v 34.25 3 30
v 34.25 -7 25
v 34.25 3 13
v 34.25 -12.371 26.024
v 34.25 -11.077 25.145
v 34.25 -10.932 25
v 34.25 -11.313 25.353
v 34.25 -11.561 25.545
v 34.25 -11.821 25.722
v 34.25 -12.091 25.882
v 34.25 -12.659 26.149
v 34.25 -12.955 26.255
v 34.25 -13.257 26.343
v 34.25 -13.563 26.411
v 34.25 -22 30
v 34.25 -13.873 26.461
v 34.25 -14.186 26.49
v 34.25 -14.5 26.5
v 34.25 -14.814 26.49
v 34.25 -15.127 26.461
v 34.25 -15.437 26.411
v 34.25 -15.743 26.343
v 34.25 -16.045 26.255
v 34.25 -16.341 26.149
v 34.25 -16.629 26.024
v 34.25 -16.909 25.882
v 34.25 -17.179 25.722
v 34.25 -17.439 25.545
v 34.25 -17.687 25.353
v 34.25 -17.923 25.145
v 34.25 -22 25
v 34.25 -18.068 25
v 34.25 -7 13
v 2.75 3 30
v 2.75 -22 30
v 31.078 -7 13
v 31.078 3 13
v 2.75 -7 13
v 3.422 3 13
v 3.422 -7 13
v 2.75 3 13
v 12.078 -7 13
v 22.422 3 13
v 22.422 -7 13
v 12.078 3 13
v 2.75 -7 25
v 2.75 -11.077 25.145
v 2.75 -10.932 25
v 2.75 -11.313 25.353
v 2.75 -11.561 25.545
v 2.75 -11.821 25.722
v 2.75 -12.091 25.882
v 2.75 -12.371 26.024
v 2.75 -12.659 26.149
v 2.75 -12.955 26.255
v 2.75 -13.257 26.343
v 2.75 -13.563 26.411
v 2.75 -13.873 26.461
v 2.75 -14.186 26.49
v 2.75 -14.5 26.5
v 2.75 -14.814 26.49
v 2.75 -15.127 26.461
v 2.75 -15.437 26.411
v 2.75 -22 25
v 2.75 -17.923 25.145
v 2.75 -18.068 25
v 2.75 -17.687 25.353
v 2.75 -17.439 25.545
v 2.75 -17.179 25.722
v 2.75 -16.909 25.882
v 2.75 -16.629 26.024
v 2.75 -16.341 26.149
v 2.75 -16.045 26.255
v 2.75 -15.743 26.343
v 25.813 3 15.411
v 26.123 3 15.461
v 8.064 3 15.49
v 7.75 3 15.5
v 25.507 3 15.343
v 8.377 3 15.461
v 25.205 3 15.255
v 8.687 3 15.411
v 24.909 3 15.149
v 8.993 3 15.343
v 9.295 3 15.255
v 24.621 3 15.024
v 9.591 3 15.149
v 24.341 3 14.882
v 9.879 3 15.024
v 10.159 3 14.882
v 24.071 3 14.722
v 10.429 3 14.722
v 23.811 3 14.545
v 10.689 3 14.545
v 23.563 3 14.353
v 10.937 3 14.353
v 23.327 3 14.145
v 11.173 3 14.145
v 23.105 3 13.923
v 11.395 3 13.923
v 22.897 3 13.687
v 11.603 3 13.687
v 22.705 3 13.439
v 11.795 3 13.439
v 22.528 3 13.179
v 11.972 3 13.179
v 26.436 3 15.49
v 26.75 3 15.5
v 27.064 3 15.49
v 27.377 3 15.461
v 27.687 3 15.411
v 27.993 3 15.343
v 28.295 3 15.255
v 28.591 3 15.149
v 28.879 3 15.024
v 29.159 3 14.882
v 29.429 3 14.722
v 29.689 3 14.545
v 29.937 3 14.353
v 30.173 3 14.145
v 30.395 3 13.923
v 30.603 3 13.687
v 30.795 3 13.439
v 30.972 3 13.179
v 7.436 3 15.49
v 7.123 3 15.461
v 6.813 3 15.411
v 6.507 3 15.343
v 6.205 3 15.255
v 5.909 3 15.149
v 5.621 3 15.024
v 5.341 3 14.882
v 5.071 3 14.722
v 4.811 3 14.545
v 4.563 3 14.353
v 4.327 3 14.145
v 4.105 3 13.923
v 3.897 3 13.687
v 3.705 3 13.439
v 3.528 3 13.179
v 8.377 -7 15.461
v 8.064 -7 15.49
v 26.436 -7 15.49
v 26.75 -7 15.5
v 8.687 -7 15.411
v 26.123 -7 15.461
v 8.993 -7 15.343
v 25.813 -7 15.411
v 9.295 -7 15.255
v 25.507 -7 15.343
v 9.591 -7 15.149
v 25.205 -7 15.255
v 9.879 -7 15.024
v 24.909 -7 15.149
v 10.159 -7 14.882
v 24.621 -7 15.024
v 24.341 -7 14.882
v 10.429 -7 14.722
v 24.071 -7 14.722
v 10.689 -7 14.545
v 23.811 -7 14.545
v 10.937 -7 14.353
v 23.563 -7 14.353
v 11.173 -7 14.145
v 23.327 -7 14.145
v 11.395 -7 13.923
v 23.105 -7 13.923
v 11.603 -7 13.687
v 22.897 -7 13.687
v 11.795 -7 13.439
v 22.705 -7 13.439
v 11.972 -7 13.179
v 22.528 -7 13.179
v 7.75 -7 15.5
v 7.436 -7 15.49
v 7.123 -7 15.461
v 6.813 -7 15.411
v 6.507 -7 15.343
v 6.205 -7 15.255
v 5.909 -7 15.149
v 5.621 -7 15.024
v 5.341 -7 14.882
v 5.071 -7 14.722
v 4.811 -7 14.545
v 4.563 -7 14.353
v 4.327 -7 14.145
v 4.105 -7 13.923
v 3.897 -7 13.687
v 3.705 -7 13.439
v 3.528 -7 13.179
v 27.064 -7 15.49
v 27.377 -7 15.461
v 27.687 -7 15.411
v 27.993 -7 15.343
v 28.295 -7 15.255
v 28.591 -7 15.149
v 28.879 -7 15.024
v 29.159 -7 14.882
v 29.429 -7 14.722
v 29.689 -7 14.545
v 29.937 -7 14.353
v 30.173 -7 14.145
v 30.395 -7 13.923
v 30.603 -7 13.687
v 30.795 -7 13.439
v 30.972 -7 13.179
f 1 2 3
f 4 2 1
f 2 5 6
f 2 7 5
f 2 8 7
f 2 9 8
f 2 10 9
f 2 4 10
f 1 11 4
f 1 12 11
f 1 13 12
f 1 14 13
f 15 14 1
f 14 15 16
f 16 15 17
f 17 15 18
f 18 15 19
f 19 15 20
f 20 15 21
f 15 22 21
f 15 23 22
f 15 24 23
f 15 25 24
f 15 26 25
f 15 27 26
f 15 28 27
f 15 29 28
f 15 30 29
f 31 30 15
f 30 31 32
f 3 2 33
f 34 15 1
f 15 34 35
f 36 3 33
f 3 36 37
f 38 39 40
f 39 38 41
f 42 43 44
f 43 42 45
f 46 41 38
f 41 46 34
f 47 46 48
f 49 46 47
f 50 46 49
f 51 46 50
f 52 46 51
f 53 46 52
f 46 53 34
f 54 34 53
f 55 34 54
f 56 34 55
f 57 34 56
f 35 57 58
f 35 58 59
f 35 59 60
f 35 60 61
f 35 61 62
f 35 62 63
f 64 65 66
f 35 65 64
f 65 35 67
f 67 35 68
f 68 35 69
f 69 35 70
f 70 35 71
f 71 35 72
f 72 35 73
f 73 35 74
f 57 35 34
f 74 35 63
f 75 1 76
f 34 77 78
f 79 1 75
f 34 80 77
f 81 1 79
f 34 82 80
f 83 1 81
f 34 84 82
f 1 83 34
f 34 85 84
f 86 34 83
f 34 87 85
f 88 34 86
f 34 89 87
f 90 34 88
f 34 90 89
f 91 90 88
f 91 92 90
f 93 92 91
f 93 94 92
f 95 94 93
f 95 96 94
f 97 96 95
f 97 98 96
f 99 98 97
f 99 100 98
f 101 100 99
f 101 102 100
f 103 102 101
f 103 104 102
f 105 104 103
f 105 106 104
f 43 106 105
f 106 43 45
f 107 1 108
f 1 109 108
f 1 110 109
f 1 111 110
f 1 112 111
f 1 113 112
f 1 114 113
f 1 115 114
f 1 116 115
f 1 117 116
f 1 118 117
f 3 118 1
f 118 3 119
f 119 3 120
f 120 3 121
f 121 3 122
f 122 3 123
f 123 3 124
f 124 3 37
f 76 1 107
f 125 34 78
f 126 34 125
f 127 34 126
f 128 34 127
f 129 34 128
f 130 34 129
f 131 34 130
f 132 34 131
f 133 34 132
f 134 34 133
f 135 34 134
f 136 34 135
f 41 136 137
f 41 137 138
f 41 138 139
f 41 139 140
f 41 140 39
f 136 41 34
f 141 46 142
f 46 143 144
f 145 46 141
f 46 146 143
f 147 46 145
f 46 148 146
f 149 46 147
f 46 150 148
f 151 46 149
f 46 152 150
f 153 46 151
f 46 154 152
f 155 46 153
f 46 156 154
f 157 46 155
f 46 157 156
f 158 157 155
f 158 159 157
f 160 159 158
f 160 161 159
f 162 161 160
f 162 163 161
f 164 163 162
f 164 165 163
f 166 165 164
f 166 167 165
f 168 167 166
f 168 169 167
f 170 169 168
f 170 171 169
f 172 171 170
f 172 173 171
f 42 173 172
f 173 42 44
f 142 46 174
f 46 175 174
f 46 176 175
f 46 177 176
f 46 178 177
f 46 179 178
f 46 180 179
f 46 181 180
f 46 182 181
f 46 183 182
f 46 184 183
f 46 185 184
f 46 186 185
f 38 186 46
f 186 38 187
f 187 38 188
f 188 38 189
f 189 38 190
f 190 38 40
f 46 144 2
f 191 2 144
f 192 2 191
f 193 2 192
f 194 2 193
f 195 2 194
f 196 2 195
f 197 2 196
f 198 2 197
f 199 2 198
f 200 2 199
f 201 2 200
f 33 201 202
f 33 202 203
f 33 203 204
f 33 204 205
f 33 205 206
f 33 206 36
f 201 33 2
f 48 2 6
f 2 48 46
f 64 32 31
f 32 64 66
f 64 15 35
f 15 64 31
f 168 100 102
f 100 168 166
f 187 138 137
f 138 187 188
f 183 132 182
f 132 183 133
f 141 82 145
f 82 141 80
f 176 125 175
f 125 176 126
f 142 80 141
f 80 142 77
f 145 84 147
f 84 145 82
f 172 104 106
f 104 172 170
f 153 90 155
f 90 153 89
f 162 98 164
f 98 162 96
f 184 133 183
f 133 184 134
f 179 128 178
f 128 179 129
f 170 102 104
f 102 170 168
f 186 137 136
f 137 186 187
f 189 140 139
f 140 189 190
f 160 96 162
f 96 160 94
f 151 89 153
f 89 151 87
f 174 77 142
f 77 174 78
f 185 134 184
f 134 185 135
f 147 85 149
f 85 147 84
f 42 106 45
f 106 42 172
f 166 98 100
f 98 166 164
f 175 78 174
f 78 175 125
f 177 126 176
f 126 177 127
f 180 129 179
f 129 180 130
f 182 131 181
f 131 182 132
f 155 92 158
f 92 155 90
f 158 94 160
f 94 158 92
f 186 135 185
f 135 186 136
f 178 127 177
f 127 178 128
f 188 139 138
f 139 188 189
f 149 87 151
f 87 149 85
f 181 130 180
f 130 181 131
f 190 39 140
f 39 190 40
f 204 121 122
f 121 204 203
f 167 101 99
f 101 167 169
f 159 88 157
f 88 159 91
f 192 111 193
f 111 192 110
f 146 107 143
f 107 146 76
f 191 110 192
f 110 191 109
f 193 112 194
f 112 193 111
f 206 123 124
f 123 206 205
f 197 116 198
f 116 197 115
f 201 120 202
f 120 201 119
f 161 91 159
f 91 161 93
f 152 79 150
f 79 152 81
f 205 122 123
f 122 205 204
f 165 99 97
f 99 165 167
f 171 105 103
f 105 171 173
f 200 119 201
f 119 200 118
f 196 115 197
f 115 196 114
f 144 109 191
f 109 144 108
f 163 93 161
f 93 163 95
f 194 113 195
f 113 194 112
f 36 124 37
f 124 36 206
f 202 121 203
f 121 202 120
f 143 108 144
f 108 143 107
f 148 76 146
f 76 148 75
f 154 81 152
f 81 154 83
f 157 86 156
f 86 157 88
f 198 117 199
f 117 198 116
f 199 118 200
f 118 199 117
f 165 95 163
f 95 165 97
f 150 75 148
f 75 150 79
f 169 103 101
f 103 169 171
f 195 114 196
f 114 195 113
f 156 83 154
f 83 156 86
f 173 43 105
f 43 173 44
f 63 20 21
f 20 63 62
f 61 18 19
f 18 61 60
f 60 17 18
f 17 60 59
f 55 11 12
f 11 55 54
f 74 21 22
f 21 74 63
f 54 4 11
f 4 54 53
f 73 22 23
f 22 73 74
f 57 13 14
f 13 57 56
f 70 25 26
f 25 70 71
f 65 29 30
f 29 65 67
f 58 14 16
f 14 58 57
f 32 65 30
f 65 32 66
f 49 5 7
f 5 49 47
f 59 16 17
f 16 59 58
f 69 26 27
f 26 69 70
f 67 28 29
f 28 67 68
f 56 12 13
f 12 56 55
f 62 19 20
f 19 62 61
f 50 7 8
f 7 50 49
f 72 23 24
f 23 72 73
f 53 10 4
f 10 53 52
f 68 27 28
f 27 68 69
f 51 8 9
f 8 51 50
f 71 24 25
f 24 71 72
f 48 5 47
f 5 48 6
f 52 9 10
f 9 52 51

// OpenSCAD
breedte = 22.7;
hele_breedte = 32.5;
diepte = 27;
dikte_rand = 2.5;
marge = 0.2;


motor_breedte = hele_breedte+marge*2;
motor_lengte = diepte+marge*2;

breedte_ruimte_tussen_2_motoren = 2;
lengte_ruimte_tussen_2_motoren = 2;


difference(){
	union(){


    

        translate([2.75,-7,13]){
            cube([
            31.5,10,17], center=false);
        }       
        translate([2.75,-22,25]){
            cube([
            31.5,15,5], center=false);
        }       

/*


        translate([-motor_breedte/2+15,-motor_lengte-motor_lengte/2-lengte_ruimte_tussen_2_motoren+6,0]){
            cube([
            motor_breedte*2+breedte_ruimte_tussen_2_motoren*2-30
            ,4
            ,18], center=false);
        }       
s
        translate([-motor_breedte/2+15,-motor_lengte-motor_lengte/2-lengte_ruimte_tussen_2_motoren+motor_lengte*2+lengte_ruimte_tussen_2_motoren*2-4-6,0]){
            cube([
            motor_breedte*2+breedte_ruimte_tussen_2_motoren*2-30
            ,4
            ,18], center=false);
        }       


        translate([-motor_breedte/2+15,-motor_lengte-motor_lengte/2-lengte_ruimte_tussen_2_motoren+6,0]){
            cube([
            4
            ,motor_breedte*2+breedte_ruimte_tussen_2_motoren*2-24
            ,30], center=false);
        }       

        translate([-motor_breedte/2+15+motor_breedte*2+breedte_ruimte_tussen_2_motoren*2-30-4,-motor_lengte-motor_lengte/2-lengte_ruimte_tussen_2_motoren+6,0]){
            cube([
            4
            ,motor_breedte*2+breedte_ruimte_tussen_2_motoren*2-24
            ,30], center=false);
        }       

*/



        

	}
	union() {
        
        translate([-20.25,-19.5,28]){
            rotate([180,0,0]){      
                // as gaten voor schuif assen        
                translate([-9.5+75/2,50,17.5]){
                    rotate([90,0,0]){
                        cylinder(h=200, r=5, $fn=100, center=false);
                    }
                }
                translate([9.5+75/2,50,17.5]){
                    rotate([90,0,0]){
                        cylinder(h=200, r=5, $fn=100, center=false);
                    }
                }        
                translate([-10,-10+5,6.5]){
                    rotate([0,90,0]){
                       cylinder(h=200, r=5, $fn=100, center=false);
                    }
                }        
               
    

            }
       }        
        

	}
}
